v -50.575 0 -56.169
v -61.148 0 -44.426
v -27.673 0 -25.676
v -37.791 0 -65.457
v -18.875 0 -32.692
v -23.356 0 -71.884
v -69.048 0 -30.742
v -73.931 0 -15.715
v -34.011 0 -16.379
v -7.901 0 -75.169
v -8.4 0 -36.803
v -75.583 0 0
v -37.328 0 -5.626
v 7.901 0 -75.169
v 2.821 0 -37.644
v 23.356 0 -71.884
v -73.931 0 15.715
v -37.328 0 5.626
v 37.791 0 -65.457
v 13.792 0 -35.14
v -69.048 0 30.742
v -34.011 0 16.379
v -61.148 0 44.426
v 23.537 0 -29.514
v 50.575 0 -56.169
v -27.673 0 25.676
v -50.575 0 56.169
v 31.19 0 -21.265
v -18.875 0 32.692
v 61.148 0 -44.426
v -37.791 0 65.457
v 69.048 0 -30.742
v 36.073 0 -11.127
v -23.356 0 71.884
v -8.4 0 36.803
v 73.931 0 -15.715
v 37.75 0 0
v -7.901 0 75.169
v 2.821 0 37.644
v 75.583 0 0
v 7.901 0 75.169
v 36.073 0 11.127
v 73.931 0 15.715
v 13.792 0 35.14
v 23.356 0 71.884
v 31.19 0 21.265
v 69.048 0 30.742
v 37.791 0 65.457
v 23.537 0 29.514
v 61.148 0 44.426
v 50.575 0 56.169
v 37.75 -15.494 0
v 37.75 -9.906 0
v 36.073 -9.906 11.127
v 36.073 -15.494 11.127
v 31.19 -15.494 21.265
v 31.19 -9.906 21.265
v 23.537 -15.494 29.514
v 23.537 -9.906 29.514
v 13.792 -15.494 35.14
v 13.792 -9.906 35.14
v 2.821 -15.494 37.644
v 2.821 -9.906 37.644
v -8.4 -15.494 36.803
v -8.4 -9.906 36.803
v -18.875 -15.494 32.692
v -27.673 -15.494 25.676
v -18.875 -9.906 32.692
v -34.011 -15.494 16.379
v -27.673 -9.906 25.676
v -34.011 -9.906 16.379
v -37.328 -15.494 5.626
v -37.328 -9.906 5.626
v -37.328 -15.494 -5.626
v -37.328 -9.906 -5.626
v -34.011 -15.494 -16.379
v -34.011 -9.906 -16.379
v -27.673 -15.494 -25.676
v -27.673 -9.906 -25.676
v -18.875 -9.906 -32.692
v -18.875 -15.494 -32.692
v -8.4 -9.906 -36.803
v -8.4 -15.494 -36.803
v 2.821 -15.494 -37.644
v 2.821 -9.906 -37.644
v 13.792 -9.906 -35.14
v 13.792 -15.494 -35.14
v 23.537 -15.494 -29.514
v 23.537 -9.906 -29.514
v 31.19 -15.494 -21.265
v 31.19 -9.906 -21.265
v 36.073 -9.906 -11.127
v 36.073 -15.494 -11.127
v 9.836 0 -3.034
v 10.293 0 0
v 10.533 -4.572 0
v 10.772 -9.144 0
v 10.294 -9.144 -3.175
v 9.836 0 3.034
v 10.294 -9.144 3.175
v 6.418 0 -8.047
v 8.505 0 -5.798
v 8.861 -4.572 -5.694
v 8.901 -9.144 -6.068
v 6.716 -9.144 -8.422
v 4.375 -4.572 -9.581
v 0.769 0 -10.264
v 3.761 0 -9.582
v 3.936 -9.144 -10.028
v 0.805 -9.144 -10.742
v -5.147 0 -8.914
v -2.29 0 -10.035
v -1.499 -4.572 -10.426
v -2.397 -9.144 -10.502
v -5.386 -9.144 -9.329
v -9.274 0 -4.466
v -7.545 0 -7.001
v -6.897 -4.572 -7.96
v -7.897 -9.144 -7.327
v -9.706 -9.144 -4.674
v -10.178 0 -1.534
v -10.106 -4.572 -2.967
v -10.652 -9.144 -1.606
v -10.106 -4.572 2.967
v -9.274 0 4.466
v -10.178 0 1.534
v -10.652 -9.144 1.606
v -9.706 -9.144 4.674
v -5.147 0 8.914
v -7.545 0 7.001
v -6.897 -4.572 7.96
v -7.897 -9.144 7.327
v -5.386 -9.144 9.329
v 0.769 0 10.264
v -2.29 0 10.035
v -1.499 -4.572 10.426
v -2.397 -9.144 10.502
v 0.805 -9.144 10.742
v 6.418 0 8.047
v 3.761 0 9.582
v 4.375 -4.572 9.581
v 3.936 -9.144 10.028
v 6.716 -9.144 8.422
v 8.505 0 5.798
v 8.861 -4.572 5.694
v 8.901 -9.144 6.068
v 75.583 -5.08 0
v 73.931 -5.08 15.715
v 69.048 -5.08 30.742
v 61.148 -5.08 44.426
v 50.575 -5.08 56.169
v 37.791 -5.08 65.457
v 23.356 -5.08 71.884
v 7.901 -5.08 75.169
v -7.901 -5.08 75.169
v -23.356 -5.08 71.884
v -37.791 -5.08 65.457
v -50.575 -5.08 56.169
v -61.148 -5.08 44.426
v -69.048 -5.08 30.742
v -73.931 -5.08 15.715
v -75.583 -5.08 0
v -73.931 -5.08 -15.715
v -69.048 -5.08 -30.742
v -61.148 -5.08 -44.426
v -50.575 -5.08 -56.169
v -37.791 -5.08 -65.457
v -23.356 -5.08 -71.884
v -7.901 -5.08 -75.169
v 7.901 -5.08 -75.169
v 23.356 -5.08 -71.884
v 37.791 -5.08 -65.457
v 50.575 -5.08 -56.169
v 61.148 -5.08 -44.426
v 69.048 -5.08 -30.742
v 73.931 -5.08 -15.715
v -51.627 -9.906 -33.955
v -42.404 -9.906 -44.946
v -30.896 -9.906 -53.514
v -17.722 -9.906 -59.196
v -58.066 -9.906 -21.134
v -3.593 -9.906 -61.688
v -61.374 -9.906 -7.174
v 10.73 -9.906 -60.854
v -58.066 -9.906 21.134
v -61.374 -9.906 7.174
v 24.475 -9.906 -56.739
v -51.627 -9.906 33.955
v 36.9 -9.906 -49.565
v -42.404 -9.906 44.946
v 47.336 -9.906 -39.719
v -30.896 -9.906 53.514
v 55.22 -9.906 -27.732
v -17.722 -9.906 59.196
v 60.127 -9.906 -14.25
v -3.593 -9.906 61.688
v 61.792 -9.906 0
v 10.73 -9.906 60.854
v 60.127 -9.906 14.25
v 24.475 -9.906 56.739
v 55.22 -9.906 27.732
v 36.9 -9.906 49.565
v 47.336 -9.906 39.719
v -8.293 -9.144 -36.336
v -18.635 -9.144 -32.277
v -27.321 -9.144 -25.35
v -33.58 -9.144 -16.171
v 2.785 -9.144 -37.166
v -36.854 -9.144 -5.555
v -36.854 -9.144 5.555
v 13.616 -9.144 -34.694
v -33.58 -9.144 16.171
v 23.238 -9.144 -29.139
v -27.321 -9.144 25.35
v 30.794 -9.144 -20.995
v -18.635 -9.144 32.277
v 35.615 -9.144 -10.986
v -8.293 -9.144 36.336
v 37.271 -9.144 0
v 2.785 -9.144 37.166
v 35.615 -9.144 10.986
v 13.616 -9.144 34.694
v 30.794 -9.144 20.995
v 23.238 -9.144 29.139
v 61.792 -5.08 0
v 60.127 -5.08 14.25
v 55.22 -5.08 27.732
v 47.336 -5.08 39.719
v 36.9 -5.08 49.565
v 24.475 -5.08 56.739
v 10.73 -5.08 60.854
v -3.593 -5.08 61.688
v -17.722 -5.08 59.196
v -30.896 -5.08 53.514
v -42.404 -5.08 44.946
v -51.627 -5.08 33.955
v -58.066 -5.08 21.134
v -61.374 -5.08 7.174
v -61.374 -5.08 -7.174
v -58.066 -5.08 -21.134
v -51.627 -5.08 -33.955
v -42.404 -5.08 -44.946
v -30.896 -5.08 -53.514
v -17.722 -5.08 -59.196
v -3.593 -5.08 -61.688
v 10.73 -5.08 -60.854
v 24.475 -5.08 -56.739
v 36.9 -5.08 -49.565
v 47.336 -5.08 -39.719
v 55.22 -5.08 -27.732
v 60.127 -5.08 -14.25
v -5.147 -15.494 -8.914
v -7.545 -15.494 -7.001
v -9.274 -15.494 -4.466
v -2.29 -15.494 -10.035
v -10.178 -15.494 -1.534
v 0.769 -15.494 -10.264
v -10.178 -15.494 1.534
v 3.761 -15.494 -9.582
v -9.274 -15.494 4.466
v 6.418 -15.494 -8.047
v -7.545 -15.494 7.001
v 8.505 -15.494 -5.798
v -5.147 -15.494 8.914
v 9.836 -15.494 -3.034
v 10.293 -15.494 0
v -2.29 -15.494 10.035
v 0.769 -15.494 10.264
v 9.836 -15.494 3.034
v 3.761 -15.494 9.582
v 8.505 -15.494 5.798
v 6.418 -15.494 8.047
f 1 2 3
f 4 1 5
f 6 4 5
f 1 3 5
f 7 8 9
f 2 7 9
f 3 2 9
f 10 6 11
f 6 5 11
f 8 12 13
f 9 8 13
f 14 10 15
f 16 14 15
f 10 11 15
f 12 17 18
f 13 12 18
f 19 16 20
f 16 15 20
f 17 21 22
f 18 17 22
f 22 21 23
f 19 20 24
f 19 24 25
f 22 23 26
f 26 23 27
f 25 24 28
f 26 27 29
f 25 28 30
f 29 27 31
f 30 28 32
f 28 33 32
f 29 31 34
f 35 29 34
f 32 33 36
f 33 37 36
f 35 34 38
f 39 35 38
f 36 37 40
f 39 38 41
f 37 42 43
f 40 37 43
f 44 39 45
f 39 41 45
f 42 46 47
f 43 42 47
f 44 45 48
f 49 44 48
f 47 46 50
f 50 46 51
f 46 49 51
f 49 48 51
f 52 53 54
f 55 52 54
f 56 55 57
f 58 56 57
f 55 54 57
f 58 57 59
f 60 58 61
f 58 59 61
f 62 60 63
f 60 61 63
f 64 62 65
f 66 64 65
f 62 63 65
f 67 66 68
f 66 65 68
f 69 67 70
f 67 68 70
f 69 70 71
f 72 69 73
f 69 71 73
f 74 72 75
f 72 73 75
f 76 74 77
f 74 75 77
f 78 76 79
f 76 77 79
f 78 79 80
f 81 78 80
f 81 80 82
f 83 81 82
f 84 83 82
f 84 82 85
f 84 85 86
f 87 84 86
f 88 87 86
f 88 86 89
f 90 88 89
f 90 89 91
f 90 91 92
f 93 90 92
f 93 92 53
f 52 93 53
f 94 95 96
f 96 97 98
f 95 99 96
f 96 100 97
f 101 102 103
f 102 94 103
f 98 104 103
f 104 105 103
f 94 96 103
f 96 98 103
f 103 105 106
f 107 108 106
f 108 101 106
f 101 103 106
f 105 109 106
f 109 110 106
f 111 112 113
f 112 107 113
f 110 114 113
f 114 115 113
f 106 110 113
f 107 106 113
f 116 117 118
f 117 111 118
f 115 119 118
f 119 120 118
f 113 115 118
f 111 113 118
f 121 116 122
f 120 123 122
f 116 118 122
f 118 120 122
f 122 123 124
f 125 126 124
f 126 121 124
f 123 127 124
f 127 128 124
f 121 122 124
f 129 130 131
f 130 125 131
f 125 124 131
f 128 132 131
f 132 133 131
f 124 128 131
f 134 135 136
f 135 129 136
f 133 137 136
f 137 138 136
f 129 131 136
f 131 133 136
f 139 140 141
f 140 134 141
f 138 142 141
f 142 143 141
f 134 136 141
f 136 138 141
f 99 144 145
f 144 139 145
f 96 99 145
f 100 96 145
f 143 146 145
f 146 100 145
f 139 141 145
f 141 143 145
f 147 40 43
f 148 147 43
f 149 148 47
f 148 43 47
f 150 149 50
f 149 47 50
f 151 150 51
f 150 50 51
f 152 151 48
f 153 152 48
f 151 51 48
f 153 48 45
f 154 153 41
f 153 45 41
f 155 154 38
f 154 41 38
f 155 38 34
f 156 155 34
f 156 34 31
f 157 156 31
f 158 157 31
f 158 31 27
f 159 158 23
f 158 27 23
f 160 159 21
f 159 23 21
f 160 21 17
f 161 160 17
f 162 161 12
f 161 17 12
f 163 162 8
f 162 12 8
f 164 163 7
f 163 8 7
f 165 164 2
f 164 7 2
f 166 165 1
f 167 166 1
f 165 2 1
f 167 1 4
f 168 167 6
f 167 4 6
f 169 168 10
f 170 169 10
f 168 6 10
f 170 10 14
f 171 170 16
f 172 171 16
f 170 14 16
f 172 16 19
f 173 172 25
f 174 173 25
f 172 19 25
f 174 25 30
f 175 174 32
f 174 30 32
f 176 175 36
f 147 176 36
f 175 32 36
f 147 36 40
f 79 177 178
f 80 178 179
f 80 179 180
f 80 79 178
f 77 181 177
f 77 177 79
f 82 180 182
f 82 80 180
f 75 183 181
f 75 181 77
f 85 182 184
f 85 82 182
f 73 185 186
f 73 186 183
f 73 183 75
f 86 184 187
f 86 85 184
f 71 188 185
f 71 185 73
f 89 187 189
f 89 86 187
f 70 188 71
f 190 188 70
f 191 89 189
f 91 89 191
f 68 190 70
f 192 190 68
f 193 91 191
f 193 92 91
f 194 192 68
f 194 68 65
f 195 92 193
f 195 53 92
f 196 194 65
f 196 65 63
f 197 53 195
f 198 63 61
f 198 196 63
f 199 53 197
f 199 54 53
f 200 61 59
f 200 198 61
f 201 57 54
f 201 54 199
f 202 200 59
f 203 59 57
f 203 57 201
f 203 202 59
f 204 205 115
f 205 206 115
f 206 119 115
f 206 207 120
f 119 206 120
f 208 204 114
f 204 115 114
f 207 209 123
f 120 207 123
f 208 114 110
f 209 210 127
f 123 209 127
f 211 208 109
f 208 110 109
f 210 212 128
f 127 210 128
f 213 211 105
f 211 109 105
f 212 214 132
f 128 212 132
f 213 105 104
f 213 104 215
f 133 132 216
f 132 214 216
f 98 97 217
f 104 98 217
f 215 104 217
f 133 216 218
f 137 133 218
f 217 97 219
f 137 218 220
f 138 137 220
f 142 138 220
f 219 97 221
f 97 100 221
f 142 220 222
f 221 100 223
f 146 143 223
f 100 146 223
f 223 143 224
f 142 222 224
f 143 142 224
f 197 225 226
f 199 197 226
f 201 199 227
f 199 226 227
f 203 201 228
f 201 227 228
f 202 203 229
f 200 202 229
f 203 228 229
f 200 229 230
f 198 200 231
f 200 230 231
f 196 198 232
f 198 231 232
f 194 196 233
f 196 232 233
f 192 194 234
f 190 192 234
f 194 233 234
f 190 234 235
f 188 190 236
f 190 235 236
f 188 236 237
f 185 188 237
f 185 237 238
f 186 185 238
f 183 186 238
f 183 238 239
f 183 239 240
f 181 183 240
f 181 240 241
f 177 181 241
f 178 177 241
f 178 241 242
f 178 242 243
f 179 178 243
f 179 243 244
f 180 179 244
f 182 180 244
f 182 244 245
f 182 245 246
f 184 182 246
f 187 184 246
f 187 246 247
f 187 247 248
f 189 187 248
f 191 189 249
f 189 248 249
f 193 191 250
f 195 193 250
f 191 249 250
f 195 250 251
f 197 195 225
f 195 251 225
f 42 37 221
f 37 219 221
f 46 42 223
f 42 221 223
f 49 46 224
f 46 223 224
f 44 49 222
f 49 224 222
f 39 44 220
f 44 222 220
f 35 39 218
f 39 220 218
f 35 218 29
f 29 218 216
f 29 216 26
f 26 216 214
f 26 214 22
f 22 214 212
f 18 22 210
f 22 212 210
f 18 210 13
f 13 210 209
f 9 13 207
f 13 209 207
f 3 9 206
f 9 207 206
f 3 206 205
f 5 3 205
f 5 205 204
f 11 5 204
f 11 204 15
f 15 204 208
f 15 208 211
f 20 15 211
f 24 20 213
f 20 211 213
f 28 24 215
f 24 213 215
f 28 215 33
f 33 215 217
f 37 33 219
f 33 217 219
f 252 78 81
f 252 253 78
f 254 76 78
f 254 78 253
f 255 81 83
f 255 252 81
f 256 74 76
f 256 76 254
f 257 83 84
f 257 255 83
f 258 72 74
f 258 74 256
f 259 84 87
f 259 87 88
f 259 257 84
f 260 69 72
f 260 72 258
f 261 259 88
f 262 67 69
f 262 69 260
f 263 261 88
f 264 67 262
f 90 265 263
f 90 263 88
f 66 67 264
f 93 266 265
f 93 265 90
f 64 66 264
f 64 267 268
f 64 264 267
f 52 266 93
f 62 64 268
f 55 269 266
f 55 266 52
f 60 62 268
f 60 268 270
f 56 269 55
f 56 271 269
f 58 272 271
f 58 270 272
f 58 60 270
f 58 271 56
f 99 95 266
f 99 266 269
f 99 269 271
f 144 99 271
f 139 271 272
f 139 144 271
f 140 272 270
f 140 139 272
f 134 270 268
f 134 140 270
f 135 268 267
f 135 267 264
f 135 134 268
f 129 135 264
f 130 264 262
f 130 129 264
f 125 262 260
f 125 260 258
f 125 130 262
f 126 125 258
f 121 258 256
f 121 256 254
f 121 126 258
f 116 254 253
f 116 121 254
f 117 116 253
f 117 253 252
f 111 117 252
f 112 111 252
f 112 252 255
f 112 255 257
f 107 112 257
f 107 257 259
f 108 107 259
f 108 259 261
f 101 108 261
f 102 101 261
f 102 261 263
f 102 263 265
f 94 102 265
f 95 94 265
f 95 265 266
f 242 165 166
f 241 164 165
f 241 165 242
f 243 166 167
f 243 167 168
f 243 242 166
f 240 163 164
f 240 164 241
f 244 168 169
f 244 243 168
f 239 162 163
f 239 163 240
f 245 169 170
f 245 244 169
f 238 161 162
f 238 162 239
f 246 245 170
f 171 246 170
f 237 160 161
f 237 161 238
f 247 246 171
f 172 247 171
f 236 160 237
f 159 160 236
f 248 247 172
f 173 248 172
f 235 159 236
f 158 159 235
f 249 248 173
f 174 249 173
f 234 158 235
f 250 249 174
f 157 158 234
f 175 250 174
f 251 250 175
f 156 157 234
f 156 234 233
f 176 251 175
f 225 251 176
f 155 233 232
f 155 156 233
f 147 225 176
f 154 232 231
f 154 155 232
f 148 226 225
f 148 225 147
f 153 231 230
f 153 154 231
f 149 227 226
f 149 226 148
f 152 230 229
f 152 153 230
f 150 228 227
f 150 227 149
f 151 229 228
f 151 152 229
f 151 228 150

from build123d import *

# Parameters (mm, degrees)
F0_R     = 75.5827918499
F0_R_2   = 61.792299123
F1_DEPTH = 5.08
F0_R_3   = 37.749771155
F2_DEPTH = 9.906
F0_R_4   = 10.2931337437
F3_DEPTH = 15.494
F4_DEPTH = 9.906
F5_DEPTH = 9.144
F5_TAPER = 3


with BuildPart() as f1:
    # F0 (on Front) → F1 (new body)
    with BuildSketch(Plane.XZ):
        Circle(F0_R)
        Circle(F0_R_2, mode=Mode.SUBTRACT)
    extrude(amount=F1_DEPTH)

    # F0 (on Front) → F2 (join)
    with BuildSketch(Plane.XZ):
        Circle(F0_R_2)
        Circle(F0_R_3, mode=Mode.SUBTRACT)
    extrude(amount=F2_DEPTH)

    # F0 (on Front) → F3 (join)
    with BuildSketch(Plane.XZ):
        Circle(F0_R_3)
        Circle(F0_R_4, mode=Mode.SUBTRACT)
    extrude(amount=F3_DEPTH)

    # F0 (on Front) → F4 (join)
    with BuildSketch(Plane.XZ):
        Circle(F0_R_3)
        Circle(F0_R_4, mode=Mode.SUBTRACT)
    extrude(amount=F4_DEPTH)

    # F0 (on Front) → F5 (cut)
    with BuildSketch(Plane.XZ):
        Circle(F0_R_3)
        Circle(F0_R_4, mode=Mode.SUBTRACT)
    extrude(amount=F5_DEPTH, taper=F5_TAPER, mode=Mode.SUBTRACT)


solid = f1.part
